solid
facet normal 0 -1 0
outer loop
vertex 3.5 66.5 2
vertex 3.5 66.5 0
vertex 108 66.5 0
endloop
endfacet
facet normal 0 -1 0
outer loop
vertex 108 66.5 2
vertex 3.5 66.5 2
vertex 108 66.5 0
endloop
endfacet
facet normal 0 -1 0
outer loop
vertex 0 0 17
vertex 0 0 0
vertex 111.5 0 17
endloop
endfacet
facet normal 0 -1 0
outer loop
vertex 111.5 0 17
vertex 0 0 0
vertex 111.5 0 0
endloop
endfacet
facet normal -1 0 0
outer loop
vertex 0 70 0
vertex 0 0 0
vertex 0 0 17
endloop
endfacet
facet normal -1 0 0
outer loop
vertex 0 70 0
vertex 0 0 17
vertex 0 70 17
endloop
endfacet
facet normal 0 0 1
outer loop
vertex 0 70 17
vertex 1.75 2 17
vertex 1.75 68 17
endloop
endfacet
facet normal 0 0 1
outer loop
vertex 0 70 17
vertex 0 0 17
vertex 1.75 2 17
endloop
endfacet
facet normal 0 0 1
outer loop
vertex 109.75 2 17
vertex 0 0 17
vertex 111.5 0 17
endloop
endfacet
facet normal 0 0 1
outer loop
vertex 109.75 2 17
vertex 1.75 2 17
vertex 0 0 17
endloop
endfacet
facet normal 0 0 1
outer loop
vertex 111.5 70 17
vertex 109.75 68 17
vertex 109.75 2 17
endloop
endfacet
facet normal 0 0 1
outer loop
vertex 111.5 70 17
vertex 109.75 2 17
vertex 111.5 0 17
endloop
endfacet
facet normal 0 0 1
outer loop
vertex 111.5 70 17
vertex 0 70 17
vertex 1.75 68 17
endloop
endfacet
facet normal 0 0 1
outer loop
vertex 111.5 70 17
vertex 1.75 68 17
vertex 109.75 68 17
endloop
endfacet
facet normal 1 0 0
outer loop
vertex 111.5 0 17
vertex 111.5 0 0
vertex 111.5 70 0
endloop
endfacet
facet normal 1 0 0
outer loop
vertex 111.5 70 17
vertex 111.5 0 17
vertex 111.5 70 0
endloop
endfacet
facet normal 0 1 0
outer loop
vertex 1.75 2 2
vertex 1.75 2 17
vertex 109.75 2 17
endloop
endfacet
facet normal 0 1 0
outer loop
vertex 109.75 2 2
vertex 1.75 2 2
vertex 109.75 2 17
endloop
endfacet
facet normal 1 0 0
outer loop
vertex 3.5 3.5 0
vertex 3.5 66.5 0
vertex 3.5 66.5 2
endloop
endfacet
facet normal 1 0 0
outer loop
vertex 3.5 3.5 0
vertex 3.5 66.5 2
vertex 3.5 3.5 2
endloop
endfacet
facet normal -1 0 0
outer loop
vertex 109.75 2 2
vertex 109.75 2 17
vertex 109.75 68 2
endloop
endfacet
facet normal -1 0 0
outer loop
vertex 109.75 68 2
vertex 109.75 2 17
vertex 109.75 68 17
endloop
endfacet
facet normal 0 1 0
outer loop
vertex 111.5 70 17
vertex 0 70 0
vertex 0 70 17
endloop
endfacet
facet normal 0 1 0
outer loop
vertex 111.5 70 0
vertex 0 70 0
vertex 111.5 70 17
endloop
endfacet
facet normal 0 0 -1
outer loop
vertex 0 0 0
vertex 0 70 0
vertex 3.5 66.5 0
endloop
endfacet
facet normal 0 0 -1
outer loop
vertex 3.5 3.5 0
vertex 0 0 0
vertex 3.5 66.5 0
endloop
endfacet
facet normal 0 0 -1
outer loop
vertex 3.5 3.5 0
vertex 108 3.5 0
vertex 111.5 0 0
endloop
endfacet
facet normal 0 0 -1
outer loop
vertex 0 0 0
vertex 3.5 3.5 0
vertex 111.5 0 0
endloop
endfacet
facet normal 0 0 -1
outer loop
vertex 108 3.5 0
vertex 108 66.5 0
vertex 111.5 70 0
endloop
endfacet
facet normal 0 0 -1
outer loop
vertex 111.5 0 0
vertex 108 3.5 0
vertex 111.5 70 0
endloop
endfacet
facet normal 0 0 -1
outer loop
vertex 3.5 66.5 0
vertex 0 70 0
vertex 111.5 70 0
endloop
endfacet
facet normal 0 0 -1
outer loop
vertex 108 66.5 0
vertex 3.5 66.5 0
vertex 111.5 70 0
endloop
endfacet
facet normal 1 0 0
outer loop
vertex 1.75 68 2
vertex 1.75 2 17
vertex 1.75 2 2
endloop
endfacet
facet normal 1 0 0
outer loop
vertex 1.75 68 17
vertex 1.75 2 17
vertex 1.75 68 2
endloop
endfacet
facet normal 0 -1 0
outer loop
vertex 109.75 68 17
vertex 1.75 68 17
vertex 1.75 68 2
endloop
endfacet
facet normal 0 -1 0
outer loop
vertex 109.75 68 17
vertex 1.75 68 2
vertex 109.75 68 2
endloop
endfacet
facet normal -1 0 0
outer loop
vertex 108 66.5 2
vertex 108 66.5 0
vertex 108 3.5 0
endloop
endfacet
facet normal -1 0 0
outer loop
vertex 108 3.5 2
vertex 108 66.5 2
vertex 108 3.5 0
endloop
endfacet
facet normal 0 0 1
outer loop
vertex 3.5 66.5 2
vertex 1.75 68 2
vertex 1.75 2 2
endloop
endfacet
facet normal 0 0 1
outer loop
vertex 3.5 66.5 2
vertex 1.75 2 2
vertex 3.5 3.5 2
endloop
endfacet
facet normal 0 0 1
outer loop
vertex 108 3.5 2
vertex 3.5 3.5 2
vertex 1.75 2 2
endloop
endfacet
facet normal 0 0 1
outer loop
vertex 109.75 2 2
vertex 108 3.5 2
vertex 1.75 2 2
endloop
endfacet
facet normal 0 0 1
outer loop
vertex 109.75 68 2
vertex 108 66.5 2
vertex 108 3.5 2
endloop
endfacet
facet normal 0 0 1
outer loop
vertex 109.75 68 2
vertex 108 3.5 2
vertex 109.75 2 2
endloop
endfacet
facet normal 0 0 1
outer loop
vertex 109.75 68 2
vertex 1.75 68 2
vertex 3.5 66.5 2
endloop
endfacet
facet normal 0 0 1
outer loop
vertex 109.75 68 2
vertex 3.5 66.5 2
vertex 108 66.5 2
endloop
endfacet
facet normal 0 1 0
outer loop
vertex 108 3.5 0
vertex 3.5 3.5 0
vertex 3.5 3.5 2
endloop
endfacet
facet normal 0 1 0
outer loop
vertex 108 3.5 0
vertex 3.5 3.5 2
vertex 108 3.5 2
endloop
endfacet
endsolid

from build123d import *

# Parameters (mm, degrees)
F0_W     = 111.5
F0_H     = 70
F1_DEPTH = 17
F2_W     = 108
F2_H     = 66
F3_DEPTH = 15
F4_W     = 104.5
F4_H     = 63
F5_DEPTH = 17.001


# Not quite as in the source:
# - a feature of the source that left no trace in its solid (it failed there, or was rolled back) is left out


with BuildPart() as f1:
    # F0 (on Top) → F1 (new body)
    with BuildSketch(Plane.XY):
        with Locations((55.75, 35)):
            Rectangle(F0_W, F0_H)
    extrude(amount=F1_DEPTH)

    # F2 (on face) → F3 (cut)
    with BuildSketch(Plane.XY.offset(17)):
        with Locations((55.75, 35)):
            Rectangle(F2_W, F2_H)
    extrude(amount=-F3_DEPTH, mode=Mode.SUBTRACT)

    # F4 (on face) → F5 (cut, through all)
    with BuildSketch(Plane(origin=(0, 0, 0), x_dir=(1, 0, 0), z_dir=(0, 0, -1))):
        with Locations((55.75, -35)):
            Rectangle(F4_W, F4_H)
    extrude(amount=-F5_DEPTH, mode=Mode.SUBTRACT)


solid = f1.part
